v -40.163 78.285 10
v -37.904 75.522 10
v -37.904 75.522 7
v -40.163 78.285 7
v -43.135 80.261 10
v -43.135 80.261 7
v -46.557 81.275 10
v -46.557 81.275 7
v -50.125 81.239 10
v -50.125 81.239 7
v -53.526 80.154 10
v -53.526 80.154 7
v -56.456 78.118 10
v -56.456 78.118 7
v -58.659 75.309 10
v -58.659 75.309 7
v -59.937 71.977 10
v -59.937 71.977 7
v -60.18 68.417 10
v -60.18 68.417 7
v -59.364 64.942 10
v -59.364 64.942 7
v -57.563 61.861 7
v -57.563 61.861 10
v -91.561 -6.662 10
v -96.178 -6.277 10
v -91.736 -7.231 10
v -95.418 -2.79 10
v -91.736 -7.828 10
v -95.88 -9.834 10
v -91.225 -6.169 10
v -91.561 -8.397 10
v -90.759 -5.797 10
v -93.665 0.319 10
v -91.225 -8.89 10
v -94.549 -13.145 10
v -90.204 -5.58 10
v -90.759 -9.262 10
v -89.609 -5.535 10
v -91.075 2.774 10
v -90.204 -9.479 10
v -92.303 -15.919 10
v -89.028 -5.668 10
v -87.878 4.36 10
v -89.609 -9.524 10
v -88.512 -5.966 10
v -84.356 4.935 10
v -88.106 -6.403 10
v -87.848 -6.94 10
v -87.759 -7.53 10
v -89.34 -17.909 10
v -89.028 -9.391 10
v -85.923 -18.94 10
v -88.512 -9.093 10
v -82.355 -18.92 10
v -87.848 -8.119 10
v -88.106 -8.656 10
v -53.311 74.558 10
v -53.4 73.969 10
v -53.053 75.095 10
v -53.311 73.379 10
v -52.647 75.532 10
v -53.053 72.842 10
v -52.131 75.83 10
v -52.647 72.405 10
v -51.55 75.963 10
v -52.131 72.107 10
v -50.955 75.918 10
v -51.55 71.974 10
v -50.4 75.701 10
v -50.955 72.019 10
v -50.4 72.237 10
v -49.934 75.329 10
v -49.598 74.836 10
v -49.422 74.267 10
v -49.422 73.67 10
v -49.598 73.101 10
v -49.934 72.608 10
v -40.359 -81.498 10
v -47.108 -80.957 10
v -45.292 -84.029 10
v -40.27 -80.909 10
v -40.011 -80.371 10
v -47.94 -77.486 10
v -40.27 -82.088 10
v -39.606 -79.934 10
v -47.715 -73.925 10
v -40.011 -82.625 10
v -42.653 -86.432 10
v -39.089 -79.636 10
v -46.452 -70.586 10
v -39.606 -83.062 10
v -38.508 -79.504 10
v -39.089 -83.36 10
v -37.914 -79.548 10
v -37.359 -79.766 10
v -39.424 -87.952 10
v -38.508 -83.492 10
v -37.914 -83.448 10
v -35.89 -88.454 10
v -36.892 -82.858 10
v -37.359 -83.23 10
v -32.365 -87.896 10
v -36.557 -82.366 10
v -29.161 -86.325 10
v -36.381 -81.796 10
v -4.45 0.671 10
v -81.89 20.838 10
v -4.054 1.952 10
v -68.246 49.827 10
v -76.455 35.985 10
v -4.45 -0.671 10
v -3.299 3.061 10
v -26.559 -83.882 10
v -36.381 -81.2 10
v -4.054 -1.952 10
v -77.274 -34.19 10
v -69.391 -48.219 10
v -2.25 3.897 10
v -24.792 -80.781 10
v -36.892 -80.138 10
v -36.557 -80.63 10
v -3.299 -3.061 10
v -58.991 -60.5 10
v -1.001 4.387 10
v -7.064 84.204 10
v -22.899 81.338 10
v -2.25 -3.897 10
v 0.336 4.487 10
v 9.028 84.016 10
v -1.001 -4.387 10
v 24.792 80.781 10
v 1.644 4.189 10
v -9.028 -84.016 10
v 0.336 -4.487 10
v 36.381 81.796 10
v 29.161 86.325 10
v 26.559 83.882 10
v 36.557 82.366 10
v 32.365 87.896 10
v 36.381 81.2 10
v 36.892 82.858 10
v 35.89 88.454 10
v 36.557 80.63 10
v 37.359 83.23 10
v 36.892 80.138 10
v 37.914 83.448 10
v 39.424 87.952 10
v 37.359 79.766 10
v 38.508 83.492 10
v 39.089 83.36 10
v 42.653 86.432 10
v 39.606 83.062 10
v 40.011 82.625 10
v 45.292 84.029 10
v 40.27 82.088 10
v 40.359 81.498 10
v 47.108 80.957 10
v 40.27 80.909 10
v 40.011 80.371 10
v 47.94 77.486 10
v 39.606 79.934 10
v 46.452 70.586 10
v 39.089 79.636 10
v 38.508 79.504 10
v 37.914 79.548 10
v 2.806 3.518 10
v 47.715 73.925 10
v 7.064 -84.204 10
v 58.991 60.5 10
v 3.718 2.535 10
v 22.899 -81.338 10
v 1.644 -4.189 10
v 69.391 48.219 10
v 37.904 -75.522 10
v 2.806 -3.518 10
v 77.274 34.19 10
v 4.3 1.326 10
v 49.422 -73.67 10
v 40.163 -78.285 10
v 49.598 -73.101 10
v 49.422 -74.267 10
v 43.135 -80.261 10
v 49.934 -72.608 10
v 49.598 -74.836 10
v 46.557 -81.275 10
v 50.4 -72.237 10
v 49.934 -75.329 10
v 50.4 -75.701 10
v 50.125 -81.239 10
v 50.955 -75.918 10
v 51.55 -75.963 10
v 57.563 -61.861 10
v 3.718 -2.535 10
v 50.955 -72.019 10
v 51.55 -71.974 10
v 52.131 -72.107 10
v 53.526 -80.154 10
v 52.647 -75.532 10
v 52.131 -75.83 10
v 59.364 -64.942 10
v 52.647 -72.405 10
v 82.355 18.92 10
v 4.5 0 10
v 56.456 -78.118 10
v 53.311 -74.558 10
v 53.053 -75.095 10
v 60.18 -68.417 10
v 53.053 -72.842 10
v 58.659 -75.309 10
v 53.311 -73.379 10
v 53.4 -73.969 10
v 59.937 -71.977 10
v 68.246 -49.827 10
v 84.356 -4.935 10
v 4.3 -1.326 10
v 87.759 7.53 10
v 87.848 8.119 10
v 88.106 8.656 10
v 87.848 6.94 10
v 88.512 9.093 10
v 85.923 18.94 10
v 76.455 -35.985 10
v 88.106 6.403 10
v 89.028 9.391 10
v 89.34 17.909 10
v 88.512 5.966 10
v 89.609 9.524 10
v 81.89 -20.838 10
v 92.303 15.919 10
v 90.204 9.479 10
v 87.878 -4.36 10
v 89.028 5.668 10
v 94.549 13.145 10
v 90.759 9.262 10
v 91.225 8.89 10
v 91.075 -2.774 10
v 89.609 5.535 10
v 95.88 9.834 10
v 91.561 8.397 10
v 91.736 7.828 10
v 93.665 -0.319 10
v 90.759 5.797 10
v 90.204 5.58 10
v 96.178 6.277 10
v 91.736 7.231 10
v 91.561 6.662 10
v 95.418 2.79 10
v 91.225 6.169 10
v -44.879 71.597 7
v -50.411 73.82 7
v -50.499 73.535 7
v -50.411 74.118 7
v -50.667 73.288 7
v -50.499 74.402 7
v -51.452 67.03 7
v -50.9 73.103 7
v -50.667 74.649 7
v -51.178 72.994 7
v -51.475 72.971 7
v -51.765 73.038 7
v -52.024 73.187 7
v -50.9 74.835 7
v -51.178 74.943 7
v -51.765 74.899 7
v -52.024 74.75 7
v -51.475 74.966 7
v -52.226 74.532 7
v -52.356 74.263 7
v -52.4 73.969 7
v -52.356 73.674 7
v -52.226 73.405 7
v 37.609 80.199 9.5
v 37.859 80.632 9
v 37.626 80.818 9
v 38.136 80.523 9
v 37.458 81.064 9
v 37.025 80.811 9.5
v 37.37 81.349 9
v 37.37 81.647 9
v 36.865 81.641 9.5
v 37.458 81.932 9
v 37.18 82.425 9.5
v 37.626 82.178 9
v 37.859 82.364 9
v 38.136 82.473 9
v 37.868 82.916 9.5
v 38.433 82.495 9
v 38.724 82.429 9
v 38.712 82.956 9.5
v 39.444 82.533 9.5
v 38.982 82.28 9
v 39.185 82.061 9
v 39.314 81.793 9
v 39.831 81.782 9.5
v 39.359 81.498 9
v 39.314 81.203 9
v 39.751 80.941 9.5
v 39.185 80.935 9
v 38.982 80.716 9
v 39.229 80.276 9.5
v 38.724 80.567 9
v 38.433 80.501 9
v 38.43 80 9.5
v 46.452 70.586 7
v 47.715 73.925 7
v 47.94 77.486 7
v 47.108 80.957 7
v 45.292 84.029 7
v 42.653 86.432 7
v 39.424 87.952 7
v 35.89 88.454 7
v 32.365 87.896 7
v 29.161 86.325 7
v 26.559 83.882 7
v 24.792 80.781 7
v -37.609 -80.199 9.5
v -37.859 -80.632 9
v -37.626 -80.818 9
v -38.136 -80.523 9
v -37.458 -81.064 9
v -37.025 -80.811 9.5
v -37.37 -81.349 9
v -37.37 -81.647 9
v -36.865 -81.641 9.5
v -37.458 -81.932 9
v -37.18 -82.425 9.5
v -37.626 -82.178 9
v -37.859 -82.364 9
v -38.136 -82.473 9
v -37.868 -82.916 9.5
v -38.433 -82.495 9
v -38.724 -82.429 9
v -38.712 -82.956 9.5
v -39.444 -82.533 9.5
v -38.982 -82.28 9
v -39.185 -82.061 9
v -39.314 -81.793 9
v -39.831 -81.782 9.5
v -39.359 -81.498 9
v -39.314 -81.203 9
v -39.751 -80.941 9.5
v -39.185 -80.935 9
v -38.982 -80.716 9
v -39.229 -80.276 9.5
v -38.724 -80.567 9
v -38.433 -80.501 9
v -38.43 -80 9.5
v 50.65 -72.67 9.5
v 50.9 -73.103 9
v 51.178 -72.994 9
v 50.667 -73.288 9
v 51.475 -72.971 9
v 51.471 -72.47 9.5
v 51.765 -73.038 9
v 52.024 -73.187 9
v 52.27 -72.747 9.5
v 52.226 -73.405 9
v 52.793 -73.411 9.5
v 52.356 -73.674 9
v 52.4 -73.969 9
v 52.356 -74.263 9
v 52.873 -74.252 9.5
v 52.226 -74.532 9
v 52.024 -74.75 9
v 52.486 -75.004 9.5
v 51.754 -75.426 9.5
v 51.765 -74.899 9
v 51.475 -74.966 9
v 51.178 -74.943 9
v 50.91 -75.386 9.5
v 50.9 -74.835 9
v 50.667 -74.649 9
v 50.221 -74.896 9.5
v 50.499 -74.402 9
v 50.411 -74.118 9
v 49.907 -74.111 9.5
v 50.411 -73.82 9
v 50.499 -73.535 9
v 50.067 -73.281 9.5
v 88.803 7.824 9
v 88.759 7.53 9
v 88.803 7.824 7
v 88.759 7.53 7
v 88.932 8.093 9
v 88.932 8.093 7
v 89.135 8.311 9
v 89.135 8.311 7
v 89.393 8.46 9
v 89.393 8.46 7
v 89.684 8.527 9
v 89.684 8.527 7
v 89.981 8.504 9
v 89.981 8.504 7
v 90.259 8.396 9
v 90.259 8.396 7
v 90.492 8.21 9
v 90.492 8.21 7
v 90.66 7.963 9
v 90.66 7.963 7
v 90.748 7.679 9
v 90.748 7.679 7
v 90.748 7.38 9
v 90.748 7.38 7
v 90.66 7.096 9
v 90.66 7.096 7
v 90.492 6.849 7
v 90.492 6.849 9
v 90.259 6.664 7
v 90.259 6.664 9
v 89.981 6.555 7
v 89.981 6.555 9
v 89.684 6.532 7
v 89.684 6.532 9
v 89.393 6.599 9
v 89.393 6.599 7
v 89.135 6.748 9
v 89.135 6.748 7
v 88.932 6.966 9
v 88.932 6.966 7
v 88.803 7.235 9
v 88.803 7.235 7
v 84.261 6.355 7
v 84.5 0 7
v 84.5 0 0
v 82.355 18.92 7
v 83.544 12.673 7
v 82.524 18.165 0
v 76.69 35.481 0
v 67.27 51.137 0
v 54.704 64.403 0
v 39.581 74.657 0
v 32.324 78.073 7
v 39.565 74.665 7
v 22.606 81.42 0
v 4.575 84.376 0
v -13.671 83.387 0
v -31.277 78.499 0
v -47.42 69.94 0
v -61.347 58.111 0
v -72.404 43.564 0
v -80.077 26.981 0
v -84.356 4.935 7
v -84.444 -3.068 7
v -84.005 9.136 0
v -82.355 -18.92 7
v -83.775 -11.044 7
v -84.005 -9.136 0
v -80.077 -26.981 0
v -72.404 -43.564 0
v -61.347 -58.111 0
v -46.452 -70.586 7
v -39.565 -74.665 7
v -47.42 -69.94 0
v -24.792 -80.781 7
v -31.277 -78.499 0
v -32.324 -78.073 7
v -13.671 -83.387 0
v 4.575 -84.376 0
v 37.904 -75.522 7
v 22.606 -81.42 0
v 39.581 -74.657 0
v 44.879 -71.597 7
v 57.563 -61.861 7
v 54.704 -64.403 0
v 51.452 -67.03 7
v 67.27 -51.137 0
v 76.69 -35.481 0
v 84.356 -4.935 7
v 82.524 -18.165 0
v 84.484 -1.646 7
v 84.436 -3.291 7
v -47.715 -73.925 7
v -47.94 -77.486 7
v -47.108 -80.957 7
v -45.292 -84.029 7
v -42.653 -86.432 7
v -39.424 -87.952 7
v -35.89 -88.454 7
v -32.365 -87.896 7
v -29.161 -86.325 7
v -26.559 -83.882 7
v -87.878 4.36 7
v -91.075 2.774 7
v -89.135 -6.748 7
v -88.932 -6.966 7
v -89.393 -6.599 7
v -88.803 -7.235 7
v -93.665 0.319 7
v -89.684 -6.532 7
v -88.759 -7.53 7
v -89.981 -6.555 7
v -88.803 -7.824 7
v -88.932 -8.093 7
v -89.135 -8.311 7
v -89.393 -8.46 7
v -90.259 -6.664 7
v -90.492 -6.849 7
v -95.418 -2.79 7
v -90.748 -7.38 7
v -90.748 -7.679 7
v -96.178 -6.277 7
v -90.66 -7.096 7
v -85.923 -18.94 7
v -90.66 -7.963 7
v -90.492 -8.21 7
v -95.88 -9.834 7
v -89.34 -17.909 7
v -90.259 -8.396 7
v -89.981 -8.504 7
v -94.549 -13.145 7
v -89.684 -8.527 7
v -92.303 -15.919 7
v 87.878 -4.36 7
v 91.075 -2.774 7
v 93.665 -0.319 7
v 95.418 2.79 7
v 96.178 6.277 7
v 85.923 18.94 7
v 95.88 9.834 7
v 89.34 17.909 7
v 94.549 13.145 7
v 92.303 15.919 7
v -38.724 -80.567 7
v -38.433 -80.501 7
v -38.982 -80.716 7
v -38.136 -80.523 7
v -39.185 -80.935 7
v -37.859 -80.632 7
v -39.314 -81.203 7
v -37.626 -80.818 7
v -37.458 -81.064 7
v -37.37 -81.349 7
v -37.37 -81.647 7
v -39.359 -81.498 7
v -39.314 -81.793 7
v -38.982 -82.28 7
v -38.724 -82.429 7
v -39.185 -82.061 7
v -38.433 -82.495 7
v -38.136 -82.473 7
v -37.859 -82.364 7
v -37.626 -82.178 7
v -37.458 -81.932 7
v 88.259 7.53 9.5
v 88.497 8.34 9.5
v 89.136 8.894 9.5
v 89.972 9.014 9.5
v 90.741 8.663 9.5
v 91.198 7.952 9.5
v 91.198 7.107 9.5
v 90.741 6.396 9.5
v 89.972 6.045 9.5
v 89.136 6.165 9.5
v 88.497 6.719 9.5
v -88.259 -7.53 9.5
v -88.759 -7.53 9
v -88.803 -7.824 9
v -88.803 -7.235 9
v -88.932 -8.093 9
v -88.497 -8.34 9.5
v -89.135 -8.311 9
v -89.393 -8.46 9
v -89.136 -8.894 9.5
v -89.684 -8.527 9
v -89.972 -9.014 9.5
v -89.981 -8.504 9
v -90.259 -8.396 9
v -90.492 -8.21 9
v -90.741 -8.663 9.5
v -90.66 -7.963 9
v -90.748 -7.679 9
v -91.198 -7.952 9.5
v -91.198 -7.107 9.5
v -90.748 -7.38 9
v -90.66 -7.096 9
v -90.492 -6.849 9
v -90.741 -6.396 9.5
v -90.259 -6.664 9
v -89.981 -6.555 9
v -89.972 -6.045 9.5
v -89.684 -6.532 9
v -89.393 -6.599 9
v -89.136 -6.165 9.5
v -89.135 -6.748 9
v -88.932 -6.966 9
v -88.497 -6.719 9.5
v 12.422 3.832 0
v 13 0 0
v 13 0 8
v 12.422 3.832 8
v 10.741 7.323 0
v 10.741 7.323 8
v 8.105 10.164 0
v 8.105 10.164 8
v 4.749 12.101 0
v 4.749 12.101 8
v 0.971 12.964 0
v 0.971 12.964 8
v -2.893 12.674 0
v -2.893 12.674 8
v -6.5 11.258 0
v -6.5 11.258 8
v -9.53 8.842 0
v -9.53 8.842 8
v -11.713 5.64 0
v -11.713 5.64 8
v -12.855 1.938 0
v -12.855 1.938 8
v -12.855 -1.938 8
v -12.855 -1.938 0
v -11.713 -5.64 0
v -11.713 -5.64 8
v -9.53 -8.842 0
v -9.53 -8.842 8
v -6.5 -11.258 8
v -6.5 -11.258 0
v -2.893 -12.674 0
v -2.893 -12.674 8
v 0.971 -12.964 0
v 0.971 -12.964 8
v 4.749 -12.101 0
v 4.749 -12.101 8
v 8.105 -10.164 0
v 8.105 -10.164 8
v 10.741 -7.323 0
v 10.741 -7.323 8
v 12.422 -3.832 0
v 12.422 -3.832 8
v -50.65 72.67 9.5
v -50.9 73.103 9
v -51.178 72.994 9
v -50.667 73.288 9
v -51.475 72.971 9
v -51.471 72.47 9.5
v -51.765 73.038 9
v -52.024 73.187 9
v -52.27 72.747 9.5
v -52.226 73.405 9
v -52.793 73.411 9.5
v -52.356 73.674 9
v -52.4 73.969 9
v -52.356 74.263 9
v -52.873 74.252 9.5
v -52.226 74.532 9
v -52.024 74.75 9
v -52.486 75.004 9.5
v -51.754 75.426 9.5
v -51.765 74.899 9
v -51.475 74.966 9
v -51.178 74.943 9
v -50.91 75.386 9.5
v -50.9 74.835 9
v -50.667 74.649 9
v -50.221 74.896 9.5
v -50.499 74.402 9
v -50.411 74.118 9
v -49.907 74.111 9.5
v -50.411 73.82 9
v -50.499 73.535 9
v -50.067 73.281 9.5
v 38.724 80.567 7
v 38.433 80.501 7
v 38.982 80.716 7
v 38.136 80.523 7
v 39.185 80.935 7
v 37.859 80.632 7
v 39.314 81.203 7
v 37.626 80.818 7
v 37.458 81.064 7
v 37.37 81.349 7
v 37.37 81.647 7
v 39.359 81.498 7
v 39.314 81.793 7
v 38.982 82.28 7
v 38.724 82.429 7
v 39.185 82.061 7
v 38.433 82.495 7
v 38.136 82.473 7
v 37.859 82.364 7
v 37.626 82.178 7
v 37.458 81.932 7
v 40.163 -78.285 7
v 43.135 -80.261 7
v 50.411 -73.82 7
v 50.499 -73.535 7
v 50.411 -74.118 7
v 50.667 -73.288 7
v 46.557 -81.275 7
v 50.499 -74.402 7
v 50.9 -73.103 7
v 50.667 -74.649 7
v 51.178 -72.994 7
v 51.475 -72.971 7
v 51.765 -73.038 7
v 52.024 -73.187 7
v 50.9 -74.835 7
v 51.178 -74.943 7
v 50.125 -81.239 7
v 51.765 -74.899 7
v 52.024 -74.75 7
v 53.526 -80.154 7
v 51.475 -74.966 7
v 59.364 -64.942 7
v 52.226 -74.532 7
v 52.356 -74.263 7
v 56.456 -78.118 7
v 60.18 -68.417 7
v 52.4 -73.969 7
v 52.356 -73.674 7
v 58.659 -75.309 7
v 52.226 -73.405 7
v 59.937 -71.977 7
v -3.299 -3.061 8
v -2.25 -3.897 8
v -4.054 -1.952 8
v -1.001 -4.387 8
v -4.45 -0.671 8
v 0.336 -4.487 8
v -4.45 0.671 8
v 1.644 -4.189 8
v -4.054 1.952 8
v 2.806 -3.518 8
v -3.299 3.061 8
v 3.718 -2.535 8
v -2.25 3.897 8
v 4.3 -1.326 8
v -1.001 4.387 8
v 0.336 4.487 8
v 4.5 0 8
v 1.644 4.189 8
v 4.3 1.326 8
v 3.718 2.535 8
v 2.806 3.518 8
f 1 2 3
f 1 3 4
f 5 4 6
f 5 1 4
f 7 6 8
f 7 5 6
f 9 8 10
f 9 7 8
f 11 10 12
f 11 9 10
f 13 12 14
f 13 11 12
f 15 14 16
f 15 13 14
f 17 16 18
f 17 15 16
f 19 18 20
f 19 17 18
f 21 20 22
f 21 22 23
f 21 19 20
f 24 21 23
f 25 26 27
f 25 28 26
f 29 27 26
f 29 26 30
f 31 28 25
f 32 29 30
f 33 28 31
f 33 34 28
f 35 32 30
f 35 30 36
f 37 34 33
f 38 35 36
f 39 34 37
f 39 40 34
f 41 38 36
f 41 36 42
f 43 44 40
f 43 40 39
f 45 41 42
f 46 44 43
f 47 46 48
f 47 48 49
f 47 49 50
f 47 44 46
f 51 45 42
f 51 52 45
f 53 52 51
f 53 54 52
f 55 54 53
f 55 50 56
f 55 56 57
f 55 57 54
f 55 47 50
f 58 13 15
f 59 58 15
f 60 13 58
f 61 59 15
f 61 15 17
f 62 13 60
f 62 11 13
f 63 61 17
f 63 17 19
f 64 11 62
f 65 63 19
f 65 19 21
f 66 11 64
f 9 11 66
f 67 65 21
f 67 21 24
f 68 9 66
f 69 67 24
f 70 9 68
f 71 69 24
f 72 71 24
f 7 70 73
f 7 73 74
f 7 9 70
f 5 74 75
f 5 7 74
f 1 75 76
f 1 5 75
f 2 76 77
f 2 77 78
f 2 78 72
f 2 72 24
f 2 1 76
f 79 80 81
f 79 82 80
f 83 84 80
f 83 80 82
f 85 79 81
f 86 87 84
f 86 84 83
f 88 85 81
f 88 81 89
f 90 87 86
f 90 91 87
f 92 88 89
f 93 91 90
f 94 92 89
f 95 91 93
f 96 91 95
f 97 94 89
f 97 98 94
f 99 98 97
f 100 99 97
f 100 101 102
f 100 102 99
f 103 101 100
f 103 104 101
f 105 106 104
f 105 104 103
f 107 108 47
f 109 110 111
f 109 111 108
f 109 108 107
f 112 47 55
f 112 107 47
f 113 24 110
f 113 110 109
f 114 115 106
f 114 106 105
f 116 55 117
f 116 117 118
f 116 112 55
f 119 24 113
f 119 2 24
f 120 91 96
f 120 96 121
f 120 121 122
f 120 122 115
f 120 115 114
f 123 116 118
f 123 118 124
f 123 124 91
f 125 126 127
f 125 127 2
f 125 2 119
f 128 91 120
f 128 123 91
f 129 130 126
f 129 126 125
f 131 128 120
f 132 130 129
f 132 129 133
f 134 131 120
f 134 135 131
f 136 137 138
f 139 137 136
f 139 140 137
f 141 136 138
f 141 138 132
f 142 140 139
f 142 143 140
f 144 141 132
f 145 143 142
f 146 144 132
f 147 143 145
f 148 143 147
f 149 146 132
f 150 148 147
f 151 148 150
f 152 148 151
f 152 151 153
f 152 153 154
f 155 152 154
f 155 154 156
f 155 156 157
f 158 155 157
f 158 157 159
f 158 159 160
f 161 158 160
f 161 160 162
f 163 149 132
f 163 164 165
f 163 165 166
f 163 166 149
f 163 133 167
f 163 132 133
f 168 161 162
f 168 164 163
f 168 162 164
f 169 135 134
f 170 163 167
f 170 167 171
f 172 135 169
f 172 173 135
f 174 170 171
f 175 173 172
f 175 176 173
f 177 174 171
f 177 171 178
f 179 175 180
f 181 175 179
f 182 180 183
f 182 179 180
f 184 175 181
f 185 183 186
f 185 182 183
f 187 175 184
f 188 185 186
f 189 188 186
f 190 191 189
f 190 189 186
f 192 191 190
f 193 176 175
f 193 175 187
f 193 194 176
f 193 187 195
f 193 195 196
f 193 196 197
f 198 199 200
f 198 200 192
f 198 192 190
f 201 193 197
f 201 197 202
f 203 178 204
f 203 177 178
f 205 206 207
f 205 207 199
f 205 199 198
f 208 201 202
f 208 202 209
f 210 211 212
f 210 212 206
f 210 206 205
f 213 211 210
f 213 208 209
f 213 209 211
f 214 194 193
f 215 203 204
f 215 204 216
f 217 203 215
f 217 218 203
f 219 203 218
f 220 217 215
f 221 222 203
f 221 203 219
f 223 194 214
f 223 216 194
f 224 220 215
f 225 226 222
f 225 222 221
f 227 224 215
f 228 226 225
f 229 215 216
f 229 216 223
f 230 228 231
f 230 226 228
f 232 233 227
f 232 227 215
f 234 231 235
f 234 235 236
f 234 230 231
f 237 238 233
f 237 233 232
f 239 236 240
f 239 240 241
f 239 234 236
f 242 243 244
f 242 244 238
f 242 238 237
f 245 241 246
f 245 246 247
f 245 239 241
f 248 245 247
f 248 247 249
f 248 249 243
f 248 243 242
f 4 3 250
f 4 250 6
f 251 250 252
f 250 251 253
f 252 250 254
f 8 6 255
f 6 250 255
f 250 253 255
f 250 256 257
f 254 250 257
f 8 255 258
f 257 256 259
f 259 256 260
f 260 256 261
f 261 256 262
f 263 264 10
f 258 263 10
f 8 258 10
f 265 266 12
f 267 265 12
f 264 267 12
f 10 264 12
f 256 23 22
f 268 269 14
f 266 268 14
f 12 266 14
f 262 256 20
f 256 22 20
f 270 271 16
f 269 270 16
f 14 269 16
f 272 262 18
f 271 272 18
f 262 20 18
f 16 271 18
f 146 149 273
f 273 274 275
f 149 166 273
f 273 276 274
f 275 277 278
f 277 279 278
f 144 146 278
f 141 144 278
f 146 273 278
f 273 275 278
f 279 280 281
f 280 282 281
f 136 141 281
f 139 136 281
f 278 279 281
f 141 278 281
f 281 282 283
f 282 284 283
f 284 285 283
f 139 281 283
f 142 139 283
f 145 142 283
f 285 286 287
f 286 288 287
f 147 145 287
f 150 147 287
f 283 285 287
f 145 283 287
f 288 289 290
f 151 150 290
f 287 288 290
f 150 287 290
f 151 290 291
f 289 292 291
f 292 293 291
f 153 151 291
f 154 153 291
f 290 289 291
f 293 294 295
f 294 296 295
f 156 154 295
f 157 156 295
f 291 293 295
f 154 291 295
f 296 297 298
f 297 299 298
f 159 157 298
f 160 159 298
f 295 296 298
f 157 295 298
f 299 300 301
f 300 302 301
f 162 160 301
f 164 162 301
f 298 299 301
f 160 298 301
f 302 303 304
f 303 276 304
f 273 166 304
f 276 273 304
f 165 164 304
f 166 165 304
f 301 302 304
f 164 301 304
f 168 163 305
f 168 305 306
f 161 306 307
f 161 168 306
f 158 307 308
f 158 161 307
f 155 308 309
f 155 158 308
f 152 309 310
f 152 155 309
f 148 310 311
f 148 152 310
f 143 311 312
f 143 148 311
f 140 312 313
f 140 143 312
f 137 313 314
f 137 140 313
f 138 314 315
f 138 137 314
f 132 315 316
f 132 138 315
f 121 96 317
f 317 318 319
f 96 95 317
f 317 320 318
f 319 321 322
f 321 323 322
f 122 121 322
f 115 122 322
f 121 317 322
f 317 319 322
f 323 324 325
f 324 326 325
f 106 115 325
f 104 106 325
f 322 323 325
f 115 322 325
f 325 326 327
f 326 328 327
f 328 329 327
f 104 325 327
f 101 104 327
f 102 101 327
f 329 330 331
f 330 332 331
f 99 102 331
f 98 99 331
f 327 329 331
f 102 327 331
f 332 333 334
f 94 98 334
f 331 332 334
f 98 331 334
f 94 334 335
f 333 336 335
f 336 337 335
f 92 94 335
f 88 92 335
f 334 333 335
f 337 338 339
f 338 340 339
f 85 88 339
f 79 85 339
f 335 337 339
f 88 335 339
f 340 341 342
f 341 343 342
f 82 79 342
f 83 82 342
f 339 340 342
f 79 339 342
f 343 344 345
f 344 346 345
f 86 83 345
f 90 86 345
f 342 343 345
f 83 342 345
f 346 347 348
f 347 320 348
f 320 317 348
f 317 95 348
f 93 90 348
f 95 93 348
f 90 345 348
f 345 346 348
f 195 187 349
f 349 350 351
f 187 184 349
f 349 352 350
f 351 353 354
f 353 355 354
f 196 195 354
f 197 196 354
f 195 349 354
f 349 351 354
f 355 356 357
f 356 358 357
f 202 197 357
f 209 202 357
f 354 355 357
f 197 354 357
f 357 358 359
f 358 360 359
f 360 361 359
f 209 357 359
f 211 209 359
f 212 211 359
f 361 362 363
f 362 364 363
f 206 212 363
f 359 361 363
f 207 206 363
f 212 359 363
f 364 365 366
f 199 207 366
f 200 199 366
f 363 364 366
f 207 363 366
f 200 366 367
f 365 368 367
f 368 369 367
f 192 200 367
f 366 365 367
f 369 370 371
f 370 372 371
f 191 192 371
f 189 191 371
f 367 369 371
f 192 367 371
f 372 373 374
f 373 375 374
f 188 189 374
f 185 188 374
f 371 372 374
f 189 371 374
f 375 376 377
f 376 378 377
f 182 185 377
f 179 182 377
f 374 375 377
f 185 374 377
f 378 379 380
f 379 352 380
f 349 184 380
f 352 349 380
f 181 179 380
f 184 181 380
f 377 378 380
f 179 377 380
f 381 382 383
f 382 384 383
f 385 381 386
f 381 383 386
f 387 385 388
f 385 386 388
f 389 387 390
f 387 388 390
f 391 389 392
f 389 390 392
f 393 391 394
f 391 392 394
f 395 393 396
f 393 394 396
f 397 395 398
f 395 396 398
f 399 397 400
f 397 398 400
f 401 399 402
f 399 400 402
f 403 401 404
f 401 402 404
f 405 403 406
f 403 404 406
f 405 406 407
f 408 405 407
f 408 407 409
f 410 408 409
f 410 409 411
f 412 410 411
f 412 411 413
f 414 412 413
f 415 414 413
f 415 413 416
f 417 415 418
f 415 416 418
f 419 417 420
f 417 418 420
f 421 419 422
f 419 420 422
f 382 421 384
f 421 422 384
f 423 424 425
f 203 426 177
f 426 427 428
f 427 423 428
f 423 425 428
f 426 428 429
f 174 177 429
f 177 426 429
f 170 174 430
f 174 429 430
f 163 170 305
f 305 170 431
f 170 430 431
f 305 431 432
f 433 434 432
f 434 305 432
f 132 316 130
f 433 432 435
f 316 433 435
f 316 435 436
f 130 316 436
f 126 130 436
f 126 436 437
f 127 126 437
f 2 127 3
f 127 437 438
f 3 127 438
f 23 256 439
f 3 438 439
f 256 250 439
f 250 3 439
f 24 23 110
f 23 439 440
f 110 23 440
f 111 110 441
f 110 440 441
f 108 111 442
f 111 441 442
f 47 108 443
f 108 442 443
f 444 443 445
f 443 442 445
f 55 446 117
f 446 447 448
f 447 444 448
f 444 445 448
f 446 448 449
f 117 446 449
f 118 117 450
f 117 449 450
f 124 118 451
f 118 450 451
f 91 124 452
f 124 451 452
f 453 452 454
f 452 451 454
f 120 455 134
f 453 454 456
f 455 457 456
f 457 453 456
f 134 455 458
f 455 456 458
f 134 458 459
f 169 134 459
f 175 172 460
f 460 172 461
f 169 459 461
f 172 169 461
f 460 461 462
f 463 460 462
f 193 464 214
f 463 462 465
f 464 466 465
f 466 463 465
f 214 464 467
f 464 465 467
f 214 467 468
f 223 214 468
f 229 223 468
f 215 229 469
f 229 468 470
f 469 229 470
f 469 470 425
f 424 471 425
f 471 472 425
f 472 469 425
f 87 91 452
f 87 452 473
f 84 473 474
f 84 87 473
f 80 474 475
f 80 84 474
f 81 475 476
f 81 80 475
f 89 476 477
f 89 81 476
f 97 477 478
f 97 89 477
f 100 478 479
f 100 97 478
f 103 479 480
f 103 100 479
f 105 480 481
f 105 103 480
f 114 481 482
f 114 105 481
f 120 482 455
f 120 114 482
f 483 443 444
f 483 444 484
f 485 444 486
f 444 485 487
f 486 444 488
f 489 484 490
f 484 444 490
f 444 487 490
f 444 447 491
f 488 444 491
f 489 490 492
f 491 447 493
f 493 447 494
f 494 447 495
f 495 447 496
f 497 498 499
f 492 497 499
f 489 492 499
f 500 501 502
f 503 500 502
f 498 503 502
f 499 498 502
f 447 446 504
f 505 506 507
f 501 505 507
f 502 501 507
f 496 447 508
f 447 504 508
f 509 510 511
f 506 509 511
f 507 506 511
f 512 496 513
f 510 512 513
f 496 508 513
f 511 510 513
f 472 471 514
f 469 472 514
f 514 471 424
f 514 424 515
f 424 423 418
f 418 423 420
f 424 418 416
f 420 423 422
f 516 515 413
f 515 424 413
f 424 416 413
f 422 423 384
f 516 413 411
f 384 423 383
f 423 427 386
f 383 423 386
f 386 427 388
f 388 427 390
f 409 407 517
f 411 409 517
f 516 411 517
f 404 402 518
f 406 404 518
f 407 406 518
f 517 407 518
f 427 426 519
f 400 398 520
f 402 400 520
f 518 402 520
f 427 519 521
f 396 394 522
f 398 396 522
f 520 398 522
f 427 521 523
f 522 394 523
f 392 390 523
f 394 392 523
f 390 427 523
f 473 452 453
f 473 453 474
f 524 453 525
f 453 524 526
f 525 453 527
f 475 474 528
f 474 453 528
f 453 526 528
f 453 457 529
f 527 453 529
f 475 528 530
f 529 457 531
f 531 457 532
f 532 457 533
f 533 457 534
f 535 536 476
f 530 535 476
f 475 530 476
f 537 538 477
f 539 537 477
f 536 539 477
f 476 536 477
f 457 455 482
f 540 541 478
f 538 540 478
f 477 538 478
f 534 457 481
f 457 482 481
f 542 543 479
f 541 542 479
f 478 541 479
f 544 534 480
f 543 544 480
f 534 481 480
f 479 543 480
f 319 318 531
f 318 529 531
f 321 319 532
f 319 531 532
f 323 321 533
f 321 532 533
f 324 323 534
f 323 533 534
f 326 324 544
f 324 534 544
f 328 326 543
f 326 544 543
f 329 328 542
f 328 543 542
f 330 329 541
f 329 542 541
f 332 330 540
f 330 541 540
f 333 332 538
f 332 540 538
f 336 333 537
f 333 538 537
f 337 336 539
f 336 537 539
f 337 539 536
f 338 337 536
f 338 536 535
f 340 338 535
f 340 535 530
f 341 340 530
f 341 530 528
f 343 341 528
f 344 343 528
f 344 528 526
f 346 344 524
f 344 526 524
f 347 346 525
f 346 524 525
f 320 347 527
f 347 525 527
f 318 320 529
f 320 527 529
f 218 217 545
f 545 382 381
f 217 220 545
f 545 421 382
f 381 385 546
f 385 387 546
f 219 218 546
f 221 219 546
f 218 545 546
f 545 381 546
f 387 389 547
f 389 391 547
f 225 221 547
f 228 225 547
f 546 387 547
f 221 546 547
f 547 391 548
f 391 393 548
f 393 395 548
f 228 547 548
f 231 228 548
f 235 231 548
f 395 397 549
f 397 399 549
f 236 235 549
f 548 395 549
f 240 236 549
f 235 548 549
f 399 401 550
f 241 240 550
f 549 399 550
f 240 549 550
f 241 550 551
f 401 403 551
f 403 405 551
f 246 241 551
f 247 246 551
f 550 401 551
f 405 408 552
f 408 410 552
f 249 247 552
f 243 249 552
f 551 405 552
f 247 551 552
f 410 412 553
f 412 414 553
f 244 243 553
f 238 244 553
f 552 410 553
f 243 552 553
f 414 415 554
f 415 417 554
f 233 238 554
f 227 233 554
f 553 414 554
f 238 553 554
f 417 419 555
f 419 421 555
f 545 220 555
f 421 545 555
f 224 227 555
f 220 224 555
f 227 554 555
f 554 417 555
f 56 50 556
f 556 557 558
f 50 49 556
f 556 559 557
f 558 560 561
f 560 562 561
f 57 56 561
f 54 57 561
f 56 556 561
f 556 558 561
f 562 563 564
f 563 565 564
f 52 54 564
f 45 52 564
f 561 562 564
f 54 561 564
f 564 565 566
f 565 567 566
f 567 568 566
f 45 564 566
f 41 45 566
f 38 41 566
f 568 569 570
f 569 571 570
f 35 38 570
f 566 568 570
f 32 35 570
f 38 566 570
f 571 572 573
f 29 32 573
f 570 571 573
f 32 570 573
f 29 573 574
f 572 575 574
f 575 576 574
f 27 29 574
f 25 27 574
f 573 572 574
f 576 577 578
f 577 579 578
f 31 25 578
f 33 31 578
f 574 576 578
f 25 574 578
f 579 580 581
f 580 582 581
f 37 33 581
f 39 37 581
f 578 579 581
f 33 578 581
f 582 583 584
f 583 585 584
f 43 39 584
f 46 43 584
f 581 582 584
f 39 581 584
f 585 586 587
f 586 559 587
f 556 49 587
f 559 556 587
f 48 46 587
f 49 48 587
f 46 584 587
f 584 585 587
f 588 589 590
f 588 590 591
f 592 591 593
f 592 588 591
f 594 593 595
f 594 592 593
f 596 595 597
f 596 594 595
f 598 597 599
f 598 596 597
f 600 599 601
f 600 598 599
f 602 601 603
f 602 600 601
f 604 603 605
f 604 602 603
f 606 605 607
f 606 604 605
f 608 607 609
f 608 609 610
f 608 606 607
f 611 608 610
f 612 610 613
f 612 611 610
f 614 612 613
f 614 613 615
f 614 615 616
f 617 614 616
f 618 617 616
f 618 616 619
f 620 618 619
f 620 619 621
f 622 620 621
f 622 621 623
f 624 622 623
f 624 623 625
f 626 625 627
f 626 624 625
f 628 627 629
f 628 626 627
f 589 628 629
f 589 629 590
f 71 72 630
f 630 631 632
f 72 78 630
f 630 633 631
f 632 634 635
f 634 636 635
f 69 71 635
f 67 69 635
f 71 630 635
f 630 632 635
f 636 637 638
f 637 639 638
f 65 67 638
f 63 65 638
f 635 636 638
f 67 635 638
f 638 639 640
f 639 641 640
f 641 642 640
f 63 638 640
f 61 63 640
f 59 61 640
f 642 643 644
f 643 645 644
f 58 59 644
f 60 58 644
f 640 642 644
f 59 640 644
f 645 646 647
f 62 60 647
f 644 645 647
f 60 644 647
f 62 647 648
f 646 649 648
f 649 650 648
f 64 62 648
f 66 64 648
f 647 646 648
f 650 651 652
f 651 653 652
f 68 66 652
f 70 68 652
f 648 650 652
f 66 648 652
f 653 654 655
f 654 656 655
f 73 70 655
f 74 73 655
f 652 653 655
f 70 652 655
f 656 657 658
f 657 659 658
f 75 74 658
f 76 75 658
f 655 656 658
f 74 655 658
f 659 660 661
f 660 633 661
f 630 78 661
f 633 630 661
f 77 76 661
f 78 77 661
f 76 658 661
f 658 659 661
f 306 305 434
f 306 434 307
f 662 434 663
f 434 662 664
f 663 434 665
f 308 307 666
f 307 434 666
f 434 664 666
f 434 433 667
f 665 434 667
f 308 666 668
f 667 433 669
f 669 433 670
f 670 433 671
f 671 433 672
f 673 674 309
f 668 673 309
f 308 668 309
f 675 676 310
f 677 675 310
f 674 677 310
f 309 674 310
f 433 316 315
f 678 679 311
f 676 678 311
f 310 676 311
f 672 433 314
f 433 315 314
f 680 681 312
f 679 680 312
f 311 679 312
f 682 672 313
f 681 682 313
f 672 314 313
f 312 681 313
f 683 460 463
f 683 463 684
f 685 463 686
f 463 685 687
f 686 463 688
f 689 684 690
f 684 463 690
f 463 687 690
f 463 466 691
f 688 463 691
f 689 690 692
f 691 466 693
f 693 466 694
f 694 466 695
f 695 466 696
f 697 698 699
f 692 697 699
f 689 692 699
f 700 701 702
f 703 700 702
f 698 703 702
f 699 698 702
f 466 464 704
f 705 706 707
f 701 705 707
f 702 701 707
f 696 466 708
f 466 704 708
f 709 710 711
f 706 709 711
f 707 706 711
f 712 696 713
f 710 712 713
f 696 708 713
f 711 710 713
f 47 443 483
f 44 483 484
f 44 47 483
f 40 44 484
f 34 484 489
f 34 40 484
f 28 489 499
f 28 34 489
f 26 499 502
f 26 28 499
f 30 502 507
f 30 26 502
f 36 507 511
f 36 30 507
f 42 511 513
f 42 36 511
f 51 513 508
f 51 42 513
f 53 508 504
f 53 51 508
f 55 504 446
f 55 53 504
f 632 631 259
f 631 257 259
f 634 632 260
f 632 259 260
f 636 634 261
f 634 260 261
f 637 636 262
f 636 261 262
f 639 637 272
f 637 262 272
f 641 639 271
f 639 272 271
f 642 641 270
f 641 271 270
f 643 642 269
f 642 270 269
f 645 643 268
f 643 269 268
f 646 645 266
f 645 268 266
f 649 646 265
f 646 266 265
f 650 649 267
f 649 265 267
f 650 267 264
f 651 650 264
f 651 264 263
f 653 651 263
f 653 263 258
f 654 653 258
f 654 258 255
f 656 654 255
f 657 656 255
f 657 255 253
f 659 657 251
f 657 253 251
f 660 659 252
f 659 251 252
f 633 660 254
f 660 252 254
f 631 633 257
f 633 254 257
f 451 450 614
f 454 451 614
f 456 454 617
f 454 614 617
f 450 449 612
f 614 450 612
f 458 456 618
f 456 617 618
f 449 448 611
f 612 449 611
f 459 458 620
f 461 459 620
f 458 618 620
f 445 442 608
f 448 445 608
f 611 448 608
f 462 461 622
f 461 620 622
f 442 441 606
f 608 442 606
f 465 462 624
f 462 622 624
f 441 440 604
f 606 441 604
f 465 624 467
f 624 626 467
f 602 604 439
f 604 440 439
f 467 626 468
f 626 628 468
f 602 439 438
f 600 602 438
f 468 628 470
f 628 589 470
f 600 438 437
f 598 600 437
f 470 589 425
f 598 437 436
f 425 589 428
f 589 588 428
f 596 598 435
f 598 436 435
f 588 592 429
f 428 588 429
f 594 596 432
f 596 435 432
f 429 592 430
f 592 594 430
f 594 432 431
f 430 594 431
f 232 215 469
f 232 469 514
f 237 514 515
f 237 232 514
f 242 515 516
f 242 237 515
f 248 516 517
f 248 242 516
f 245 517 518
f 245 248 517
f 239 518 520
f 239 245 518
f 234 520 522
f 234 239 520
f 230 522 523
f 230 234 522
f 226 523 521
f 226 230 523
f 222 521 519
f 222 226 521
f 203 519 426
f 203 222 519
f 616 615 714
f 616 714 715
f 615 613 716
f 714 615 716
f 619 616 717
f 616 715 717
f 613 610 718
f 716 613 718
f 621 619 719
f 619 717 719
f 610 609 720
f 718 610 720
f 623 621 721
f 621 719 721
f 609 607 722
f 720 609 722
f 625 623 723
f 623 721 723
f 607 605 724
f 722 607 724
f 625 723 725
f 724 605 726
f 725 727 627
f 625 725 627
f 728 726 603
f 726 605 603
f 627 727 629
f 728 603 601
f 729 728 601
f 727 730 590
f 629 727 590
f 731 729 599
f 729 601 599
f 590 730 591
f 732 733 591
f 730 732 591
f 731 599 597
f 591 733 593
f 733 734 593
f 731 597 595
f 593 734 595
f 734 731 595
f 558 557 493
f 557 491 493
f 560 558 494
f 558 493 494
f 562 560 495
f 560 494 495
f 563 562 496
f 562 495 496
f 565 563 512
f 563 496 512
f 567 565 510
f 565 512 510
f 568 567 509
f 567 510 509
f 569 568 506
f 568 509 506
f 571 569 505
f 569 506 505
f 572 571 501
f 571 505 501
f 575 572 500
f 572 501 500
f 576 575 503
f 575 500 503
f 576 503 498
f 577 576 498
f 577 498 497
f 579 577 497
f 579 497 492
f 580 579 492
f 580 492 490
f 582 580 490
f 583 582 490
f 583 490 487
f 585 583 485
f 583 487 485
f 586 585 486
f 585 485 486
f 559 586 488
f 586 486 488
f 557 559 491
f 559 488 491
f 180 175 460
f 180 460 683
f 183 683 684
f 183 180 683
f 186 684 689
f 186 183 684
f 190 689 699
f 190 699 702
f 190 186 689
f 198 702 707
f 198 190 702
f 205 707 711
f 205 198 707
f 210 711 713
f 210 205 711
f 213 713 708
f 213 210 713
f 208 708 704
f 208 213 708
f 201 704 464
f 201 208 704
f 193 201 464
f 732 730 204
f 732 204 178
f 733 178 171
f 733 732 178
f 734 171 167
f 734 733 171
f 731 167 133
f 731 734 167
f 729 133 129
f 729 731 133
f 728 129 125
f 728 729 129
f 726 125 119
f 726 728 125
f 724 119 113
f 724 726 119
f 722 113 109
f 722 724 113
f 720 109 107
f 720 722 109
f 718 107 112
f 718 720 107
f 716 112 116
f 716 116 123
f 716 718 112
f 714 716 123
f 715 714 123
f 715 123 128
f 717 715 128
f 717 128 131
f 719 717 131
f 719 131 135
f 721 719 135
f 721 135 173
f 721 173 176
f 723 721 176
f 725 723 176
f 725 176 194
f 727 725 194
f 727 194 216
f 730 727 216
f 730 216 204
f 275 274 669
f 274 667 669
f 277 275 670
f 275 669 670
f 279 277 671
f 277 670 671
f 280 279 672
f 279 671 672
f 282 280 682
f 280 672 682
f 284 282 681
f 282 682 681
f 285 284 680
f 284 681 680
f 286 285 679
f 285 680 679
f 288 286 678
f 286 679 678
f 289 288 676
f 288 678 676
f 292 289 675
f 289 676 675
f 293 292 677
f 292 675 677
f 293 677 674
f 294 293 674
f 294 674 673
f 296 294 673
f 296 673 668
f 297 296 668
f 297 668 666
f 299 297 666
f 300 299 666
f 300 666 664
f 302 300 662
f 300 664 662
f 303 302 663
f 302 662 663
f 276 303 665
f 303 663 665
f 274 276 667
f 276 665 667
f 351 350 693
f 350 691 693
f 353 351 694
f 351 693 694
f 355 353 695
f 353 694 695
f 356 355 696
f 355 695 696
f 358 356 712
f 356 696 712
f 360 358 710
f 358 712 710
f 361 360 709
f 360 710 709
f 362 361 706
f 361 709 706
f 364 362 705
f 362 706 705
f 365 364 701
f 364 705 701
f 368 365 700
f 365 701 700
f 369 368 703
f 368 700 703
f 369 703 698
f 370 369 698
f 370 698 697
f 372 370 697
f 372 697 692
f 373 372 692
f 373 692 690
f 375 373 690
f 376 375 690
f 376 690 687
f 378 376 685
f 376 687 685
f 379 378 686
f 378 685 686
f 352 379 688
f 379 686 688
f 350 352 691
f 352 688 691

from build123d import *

# Parameters (mm, degrees)
SKETCH1_R                                       = 84.5
SKETCH1_R_2                                     = 4.5
BOSS_EXTRUDE1_DEPTH                             = 10
SKETCH2_R                                       = 13
CUT_EXTRUDE1_DEPTH                              = 8
SKETCH3_R                                       = 12
BOSS_EXTRUDE2_DEPTH                             = 3
CIRPATTERN1_COUNT                               = 6
CSK_FOR_M2_FLAT_HEAD_MACHINE_SCREW1_D           = 2
CSK_FOR_M2_FLAT_HEAD_MACHINE_SCREW1_CSINK_D     = 4
CSK_FOR_M2_FLAT_HEAD_MACHINE_SCREW1_CSINK_ANGLE = 90
CIRPATTERN2_COUNT                               = 6


with BuildPart() as part:
    # Sketch1 → Boss-Extrude1 (new body)
    with BuildSketch(Plane.XY):
        Circle(SKETCH1_R)
        Circle(SKETCH1_R_2, mode=Mode.SUBTRACT)
    extrude(amount=BOSS_EXTRUDE1_DEPTH)

    # Sketch2 → Cut-Extrude1 (cut)
    with BuildSketch(Plane.XY):
        Circle(SKETCH2_R)
    extrude(amount=CUT_EXTRUDE1_DEPTH, mode=Mode.SUBTRACT)

    # Sketch3 → Boss-Extrude2 (add)
    with BuildSketch(Plane.XY.offset(10)):
        with Locations((84.204250337, 7.063584439)):
            Circle(SKETCH3_R)
    boss_extrude2 = extrude(amount=-BOSS_EXTRUDE2_DEPTH)

    # CirPattern1: Boss-Extrude2 ×6 about axis
    cirpattern1_axis = Axis((0, 0, 0), (0, 0, 1))
    for i in range(1, CIRPATTERN1_COUNT):
        add(boss_extrude2.rotate(cirpattern1_axis, i * 360 / CIRPATTERN1_COUNT))

    # CSK for M2 Flat Head Machine Screw1 (through all)
    with Locations(Plane(origin=(89.758705981, 7.529527266, 10), x_dir=(1, 0, 0), z_dir=(0, 0, 1))):
        with Locations((0, 0)):
            csk_for_m2_flat_head_machine_screw1 = CounterSinkHole(CSK_FOR_M2_FLAT_HEAD_MACHINE_SCREW1_D / 2, CSK_FOR_M2_FLAT_HEAD_MACHINE_SCREW1_CSINK_D / 2, counter_sink_angle=CSK_FOR_M2_FLAT_HEAD_MACHINE_SCREW1_CSINK_ANGLE)

    # CirPattern2: CSK for M2 Flat Head Machine Screw1 ×6 about axis
    cirpattern2_axis = Axis((0, 0, 0), (0, 0, 1))
    for i in range(1, CIRPATTERN2_COUNT):
        add(csk_for_m2_flat_head_machine_screw1.rotate(cirpattern2_axis, i * 360 / CIRPATTERN2_COUNT), mode=Mode.SUBTRACT)


solid = part.part
